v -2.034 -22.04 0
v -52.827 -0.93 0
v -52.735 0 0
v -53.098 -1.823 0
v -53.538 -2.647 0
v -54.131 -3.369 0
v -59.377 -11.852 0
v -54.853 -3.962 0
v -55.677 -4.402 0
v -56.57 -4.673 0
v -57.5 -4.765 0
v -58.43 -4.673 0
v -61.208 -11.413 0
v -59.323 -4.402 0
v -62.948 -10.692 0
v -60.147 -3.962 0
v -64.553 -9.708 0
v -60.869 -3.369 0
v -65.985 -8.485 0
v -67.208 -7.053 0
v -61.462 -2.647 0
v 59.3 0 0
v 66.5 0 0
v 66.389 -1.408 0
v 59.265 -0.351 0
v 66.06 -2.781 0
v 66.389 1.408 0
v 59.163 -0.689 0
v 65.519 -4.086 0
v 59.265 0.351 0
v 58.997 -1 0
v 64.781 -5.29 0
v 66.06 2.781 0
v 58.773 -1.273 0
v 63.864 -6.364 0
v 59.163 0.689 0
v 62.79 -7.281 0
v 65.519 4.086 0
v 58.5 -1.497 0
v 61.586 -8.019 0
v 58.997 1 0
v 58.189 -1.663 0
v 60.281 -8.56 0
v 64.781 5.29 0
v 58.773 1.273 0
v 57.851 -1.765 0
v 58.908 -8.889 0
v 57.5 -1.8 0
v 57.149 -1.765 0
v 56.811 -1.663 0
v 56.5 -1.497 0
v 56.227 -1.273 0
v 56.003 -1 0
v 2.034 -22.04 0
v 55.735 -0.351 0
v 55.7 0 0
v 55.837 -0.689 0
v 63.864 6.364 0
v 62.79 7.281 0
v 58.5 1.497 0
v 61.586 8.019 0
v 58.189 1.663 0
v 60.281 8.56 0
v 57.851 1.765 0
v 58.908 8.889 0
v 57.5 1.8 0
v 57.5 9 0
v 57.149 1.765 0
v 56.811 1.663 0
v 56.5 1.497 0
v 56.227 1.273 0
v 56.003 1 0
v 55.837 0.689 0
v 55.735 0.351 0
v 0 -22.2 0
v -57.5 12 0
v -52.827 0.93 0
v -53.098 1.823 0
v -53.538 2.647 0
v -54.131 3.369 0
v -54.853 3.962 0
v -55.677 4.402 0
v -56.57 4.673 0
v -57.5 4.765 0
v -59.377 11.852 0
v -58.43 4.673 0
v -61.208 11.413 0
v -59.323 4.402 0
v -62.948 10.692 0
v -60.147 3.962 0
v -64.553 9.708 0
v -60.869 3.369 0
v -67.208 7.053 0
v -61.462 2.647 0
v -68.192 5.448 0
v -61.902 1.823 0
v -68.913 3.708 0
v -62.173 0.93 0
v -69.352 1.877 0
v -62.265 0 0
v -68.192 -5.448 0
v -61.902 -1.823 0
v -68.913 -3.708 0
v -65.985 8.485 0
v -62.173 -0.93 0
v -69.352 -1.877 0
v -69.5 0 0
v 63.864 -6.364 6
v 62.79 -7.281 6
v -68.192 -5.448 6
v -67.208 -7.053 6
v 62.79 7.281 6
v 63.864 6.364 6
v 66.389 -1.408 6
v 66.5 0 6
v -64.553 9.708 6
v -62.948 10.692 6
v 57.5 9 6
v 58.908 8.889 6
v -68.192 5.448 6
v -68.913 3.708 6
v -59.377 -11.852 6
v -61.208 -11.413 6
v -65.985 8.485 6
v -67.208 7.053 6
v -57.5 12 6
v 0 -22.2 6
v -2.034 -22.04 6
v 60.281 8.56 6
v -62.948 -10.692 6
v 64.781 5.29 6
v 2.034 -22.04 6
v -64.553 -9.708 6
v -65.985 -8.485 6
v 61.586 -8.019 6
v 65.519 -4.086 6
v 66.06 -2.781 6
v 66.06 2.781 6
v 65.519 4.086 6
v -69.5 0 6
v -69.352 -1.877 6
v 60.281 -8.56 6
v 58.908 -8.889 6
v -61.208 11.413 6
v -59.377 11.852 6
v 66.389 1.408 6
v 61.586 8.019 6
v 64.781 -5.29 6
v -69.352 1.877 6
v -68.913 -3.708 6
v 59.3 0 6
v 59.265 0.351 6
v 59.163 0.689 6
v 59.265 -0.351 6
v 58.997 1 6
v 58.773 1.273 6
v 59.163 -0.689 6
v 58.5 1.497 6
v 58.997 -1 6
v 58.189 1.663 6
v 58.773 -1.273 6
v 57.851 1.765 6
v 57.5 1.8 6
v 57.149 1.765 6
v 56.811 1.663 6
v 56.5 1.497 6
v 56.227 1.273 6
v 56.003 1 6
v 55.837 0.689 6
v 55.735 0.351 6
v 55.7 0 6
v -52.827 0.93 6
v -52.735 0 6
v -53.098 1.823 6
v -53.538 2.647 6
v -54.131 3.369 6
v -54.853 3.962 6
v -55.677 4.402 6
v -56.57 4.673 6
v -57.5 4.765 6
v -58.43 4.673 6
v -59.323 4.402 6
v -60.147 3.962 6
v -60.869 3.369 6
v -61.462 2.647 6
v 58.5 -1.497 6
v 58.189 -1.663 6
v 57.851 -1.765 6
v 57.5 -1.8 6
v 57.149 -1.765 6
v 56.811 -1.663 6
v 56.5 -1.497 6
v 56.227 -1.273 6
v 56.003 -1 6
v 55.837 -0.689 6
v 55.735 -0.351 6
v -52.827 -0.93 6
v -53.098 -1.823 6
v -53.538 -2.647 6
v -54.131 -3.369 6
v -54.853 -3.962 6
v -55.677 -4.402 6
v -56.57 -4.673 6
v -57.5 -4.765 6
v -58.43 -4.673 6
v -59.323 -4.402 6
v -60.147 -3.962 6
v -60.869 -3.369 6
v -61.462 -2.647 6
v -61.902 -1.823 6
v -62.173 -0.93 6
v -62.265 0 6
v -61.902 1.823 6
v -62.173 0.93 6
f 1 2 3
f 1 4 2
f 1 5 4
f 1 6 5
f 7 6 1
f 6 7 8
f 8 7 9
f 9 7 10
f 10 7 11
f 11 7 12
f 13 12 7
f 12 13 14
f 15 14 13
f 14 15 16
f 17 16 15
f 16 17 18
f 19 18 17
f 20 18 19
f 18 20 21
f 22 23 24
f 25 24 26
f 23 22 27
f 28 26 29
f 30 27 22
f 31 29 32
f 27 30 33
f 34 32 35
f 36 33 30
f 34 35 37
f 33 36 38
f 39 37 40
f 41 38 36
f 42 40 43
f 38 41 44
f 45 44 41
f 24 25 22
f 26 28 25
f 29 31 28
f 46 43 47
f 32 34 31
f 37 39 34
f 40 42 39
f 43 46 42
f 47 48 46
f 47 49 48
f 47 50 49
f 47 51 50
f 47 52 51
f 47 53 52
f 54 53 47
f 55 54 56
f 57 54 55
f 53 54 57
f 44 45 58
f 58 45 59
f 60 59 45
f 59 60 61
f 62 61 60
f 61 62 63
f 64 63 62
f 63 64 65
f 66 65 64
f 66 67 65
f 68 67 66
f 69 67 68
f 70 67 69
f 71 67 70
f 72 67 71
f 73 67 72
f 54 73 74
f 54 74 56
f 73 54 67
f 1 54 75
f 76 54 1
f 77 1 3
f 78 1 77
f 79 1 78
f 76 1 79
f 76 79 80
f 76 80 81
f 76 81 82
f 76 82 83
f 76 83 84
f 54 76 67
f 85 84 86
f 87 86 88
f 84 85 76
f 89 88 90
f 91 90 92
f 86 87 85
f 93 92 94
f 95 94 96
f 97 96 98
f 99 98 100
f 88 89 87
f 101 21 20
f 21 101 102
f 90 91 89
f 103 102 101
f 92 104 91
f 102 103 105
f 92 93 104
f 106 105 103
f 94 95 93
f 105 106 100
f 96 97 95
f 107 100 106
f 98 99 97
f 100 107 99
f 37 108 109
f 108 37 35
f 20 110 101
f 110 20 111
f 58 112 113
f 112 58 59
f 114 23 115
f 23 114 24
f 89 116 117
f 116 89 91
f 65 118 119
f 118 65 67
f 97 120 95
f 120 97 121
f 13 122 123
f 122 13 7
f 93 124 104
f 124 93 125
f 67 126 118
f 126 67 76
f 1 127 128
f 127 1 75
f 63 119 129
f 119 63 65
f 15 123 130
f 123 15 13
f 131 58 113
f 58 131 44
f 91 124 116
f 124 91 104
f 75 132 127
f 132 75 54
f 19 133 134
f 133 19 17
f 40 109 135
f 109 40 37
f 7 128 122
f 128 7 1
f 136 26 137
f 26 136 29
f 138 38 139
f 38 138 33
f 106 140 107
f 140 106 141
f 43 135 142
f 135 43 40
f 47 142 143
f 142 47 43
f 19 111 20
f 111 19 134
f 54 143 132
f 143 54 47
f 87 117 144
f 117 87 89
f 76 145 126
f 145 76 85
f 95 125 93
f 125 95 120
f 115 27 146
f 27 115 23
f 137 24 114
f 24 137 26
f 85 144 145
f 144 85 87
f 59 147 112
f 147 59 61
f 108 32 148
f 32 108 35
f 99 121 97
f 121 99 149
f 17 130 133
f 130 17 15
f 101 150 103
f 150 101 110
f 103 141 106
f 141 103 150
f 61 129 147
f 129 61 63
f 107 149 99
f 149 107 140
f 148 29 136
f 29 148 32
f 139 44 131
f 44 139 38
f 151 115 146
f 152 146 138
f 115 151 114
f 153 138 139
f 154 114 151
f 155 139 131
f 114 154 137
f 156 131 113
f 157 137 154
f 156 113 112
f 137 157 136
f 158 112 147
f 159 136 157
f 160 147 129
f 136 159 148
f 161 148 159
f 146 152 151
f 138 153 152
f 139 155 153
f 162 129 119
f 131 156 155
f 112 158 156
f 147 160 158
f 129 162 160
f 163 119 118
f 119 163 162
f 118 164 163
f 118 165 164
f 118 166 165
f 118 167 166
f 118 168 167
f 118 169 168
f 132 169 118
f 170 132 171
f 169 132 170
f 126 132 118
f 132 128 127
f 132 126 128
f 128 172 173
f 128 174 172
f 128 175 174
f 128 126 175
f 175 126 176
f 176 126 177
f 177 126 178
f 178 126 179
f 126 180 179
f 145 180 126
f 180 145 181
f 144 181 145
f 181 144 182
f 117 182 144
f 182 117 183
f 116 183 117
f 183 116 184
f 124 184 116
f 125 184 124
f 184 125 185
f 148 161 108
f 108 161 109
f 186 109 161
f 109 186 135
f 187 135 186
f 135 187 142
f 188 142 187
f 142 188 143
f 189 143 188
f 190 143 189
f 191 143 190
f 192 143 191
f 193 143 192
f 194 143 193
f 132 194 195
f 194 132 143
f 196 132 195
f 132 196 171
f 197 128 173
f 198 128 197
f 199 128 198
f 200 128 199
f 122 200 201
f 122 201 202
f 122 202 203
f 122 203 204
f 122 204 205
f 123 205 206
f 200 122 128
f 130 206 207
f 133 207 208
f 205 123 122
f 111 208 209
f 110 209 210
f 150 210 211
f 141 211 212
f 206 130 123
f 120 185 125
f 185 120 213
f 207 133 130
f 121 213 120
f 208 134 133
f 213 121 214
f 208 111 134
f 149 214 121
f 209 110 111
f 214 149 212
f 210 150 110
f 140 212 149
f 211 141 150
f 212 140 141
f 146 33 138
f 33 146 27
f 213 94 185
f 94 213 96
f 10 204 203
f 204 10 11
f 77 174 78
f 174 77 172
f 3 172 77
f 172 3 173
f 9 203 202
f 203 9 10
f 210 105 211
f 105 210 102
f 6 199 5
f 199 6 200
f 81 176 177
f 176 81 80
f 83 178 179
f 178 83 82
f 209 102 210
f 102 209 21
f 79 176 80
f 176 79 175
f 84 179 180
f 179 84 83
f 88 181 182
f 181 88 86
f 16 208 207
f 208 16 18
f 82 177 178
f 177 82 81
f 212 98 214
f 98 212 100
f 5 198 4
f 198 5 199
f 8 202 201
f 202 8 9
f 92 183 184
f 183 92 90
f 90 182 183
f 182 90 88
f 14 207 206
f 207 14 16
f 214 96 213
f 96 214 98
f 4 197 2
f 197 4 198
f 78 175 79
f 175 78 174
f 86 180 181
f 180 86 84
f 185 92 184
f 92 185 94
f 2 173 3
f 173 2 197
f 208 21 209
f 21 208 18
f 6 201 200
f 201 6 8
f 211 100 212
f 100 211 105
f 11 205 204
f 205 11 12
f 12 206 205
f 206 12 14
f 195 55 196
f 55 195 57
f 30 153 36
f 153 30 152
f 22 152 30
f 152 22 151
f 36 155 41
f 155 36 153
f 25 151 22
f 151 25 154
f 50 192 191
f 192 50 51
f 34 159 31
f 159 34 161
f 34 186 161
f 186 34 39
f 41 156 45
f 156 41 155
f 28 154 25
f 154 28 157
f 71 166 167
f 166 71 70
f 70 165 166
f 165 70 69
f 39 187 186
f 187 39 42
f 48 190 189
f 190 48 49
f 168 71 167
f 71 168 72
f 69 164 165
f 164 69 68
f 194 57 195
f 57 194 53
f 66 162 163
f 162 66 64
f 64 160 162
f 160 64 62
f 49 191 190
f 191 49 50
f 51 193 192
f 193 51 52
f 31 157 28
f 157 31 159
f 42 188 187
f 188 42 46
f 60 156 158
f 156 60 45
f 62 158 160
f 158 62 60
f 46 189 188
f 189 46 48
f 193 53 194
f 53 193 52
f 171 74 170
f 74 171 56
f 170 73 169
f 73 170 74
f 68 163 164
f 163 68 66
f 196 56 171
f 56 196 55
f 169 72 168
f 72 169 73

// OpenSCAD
$fn = 32;

// ----------------------------------------------------------------------
// Lever: 115 mm between the bosses, 6 mm thick, smooth outline
// ----------------------------------------------------------------------

// --- parameters (mm) ---
lever_l = 115;            // distance between the boss centres
boss_a = 24;              // first boss diameter
boss_b = 18;              // second boss diameter
bore_a = 9.53;            // first bore
bore_b = 3.6;             // second bore
lever_t = 6;              // lever thickness
boss_c = 26;              // middle boss diameter
bend = 9.2;               // how far the middle boss drops

lever_profile = [[-69.5, 0], [-69.352, -1.877], [-68.913, -3.708], [-68.192, -5.448], [-67.208, -7.053], [-65.985, -8.485], [-64.553, -9.708], [-62.948, -10.692], [-61.208, -11.413], [-59.377, -11.852], [-2.034, -22.04], [0, -22.2], [2.034, -22.04], [58.908, -8.889], [60.281, -8.56], [61.586, -8.019], [62.79, -7.281], [63.864, -6.364], [64.781, -5.29], [65.519, -4.086], [66.06, -2.781], [66.389, -1.408], [66.5, 0], [66.389, 1.408], [66.06, 2.781], [65.519, 4.086], [64.781, 5.29], [63.864, 6.364], [62.79, 7.281], [61.586, 8.019], [60.281, 8.56], [58.908, 8.889], [57.5, 9], [-57.5, 12], [-59.377, 11.852], [-61.208, 11.413], [-62.948, 10.692], [-64.553, 9.708], [-65.985, 8.485], [-67.208, 7.053], [-68.192, 5.448], [-68.913, 3.708], [-69.352, 1.877]];

difference() {
  linear_extrude(height = lever_t) polygon(lever_profile);
  translate([-57.5, 0, -2.5]) cylinder(h = lever_t + 5, d = bore_a);
  translate([57.5, 0, -2.5]) cylinder(h = lever_t + 5, d = bore_b);
}
